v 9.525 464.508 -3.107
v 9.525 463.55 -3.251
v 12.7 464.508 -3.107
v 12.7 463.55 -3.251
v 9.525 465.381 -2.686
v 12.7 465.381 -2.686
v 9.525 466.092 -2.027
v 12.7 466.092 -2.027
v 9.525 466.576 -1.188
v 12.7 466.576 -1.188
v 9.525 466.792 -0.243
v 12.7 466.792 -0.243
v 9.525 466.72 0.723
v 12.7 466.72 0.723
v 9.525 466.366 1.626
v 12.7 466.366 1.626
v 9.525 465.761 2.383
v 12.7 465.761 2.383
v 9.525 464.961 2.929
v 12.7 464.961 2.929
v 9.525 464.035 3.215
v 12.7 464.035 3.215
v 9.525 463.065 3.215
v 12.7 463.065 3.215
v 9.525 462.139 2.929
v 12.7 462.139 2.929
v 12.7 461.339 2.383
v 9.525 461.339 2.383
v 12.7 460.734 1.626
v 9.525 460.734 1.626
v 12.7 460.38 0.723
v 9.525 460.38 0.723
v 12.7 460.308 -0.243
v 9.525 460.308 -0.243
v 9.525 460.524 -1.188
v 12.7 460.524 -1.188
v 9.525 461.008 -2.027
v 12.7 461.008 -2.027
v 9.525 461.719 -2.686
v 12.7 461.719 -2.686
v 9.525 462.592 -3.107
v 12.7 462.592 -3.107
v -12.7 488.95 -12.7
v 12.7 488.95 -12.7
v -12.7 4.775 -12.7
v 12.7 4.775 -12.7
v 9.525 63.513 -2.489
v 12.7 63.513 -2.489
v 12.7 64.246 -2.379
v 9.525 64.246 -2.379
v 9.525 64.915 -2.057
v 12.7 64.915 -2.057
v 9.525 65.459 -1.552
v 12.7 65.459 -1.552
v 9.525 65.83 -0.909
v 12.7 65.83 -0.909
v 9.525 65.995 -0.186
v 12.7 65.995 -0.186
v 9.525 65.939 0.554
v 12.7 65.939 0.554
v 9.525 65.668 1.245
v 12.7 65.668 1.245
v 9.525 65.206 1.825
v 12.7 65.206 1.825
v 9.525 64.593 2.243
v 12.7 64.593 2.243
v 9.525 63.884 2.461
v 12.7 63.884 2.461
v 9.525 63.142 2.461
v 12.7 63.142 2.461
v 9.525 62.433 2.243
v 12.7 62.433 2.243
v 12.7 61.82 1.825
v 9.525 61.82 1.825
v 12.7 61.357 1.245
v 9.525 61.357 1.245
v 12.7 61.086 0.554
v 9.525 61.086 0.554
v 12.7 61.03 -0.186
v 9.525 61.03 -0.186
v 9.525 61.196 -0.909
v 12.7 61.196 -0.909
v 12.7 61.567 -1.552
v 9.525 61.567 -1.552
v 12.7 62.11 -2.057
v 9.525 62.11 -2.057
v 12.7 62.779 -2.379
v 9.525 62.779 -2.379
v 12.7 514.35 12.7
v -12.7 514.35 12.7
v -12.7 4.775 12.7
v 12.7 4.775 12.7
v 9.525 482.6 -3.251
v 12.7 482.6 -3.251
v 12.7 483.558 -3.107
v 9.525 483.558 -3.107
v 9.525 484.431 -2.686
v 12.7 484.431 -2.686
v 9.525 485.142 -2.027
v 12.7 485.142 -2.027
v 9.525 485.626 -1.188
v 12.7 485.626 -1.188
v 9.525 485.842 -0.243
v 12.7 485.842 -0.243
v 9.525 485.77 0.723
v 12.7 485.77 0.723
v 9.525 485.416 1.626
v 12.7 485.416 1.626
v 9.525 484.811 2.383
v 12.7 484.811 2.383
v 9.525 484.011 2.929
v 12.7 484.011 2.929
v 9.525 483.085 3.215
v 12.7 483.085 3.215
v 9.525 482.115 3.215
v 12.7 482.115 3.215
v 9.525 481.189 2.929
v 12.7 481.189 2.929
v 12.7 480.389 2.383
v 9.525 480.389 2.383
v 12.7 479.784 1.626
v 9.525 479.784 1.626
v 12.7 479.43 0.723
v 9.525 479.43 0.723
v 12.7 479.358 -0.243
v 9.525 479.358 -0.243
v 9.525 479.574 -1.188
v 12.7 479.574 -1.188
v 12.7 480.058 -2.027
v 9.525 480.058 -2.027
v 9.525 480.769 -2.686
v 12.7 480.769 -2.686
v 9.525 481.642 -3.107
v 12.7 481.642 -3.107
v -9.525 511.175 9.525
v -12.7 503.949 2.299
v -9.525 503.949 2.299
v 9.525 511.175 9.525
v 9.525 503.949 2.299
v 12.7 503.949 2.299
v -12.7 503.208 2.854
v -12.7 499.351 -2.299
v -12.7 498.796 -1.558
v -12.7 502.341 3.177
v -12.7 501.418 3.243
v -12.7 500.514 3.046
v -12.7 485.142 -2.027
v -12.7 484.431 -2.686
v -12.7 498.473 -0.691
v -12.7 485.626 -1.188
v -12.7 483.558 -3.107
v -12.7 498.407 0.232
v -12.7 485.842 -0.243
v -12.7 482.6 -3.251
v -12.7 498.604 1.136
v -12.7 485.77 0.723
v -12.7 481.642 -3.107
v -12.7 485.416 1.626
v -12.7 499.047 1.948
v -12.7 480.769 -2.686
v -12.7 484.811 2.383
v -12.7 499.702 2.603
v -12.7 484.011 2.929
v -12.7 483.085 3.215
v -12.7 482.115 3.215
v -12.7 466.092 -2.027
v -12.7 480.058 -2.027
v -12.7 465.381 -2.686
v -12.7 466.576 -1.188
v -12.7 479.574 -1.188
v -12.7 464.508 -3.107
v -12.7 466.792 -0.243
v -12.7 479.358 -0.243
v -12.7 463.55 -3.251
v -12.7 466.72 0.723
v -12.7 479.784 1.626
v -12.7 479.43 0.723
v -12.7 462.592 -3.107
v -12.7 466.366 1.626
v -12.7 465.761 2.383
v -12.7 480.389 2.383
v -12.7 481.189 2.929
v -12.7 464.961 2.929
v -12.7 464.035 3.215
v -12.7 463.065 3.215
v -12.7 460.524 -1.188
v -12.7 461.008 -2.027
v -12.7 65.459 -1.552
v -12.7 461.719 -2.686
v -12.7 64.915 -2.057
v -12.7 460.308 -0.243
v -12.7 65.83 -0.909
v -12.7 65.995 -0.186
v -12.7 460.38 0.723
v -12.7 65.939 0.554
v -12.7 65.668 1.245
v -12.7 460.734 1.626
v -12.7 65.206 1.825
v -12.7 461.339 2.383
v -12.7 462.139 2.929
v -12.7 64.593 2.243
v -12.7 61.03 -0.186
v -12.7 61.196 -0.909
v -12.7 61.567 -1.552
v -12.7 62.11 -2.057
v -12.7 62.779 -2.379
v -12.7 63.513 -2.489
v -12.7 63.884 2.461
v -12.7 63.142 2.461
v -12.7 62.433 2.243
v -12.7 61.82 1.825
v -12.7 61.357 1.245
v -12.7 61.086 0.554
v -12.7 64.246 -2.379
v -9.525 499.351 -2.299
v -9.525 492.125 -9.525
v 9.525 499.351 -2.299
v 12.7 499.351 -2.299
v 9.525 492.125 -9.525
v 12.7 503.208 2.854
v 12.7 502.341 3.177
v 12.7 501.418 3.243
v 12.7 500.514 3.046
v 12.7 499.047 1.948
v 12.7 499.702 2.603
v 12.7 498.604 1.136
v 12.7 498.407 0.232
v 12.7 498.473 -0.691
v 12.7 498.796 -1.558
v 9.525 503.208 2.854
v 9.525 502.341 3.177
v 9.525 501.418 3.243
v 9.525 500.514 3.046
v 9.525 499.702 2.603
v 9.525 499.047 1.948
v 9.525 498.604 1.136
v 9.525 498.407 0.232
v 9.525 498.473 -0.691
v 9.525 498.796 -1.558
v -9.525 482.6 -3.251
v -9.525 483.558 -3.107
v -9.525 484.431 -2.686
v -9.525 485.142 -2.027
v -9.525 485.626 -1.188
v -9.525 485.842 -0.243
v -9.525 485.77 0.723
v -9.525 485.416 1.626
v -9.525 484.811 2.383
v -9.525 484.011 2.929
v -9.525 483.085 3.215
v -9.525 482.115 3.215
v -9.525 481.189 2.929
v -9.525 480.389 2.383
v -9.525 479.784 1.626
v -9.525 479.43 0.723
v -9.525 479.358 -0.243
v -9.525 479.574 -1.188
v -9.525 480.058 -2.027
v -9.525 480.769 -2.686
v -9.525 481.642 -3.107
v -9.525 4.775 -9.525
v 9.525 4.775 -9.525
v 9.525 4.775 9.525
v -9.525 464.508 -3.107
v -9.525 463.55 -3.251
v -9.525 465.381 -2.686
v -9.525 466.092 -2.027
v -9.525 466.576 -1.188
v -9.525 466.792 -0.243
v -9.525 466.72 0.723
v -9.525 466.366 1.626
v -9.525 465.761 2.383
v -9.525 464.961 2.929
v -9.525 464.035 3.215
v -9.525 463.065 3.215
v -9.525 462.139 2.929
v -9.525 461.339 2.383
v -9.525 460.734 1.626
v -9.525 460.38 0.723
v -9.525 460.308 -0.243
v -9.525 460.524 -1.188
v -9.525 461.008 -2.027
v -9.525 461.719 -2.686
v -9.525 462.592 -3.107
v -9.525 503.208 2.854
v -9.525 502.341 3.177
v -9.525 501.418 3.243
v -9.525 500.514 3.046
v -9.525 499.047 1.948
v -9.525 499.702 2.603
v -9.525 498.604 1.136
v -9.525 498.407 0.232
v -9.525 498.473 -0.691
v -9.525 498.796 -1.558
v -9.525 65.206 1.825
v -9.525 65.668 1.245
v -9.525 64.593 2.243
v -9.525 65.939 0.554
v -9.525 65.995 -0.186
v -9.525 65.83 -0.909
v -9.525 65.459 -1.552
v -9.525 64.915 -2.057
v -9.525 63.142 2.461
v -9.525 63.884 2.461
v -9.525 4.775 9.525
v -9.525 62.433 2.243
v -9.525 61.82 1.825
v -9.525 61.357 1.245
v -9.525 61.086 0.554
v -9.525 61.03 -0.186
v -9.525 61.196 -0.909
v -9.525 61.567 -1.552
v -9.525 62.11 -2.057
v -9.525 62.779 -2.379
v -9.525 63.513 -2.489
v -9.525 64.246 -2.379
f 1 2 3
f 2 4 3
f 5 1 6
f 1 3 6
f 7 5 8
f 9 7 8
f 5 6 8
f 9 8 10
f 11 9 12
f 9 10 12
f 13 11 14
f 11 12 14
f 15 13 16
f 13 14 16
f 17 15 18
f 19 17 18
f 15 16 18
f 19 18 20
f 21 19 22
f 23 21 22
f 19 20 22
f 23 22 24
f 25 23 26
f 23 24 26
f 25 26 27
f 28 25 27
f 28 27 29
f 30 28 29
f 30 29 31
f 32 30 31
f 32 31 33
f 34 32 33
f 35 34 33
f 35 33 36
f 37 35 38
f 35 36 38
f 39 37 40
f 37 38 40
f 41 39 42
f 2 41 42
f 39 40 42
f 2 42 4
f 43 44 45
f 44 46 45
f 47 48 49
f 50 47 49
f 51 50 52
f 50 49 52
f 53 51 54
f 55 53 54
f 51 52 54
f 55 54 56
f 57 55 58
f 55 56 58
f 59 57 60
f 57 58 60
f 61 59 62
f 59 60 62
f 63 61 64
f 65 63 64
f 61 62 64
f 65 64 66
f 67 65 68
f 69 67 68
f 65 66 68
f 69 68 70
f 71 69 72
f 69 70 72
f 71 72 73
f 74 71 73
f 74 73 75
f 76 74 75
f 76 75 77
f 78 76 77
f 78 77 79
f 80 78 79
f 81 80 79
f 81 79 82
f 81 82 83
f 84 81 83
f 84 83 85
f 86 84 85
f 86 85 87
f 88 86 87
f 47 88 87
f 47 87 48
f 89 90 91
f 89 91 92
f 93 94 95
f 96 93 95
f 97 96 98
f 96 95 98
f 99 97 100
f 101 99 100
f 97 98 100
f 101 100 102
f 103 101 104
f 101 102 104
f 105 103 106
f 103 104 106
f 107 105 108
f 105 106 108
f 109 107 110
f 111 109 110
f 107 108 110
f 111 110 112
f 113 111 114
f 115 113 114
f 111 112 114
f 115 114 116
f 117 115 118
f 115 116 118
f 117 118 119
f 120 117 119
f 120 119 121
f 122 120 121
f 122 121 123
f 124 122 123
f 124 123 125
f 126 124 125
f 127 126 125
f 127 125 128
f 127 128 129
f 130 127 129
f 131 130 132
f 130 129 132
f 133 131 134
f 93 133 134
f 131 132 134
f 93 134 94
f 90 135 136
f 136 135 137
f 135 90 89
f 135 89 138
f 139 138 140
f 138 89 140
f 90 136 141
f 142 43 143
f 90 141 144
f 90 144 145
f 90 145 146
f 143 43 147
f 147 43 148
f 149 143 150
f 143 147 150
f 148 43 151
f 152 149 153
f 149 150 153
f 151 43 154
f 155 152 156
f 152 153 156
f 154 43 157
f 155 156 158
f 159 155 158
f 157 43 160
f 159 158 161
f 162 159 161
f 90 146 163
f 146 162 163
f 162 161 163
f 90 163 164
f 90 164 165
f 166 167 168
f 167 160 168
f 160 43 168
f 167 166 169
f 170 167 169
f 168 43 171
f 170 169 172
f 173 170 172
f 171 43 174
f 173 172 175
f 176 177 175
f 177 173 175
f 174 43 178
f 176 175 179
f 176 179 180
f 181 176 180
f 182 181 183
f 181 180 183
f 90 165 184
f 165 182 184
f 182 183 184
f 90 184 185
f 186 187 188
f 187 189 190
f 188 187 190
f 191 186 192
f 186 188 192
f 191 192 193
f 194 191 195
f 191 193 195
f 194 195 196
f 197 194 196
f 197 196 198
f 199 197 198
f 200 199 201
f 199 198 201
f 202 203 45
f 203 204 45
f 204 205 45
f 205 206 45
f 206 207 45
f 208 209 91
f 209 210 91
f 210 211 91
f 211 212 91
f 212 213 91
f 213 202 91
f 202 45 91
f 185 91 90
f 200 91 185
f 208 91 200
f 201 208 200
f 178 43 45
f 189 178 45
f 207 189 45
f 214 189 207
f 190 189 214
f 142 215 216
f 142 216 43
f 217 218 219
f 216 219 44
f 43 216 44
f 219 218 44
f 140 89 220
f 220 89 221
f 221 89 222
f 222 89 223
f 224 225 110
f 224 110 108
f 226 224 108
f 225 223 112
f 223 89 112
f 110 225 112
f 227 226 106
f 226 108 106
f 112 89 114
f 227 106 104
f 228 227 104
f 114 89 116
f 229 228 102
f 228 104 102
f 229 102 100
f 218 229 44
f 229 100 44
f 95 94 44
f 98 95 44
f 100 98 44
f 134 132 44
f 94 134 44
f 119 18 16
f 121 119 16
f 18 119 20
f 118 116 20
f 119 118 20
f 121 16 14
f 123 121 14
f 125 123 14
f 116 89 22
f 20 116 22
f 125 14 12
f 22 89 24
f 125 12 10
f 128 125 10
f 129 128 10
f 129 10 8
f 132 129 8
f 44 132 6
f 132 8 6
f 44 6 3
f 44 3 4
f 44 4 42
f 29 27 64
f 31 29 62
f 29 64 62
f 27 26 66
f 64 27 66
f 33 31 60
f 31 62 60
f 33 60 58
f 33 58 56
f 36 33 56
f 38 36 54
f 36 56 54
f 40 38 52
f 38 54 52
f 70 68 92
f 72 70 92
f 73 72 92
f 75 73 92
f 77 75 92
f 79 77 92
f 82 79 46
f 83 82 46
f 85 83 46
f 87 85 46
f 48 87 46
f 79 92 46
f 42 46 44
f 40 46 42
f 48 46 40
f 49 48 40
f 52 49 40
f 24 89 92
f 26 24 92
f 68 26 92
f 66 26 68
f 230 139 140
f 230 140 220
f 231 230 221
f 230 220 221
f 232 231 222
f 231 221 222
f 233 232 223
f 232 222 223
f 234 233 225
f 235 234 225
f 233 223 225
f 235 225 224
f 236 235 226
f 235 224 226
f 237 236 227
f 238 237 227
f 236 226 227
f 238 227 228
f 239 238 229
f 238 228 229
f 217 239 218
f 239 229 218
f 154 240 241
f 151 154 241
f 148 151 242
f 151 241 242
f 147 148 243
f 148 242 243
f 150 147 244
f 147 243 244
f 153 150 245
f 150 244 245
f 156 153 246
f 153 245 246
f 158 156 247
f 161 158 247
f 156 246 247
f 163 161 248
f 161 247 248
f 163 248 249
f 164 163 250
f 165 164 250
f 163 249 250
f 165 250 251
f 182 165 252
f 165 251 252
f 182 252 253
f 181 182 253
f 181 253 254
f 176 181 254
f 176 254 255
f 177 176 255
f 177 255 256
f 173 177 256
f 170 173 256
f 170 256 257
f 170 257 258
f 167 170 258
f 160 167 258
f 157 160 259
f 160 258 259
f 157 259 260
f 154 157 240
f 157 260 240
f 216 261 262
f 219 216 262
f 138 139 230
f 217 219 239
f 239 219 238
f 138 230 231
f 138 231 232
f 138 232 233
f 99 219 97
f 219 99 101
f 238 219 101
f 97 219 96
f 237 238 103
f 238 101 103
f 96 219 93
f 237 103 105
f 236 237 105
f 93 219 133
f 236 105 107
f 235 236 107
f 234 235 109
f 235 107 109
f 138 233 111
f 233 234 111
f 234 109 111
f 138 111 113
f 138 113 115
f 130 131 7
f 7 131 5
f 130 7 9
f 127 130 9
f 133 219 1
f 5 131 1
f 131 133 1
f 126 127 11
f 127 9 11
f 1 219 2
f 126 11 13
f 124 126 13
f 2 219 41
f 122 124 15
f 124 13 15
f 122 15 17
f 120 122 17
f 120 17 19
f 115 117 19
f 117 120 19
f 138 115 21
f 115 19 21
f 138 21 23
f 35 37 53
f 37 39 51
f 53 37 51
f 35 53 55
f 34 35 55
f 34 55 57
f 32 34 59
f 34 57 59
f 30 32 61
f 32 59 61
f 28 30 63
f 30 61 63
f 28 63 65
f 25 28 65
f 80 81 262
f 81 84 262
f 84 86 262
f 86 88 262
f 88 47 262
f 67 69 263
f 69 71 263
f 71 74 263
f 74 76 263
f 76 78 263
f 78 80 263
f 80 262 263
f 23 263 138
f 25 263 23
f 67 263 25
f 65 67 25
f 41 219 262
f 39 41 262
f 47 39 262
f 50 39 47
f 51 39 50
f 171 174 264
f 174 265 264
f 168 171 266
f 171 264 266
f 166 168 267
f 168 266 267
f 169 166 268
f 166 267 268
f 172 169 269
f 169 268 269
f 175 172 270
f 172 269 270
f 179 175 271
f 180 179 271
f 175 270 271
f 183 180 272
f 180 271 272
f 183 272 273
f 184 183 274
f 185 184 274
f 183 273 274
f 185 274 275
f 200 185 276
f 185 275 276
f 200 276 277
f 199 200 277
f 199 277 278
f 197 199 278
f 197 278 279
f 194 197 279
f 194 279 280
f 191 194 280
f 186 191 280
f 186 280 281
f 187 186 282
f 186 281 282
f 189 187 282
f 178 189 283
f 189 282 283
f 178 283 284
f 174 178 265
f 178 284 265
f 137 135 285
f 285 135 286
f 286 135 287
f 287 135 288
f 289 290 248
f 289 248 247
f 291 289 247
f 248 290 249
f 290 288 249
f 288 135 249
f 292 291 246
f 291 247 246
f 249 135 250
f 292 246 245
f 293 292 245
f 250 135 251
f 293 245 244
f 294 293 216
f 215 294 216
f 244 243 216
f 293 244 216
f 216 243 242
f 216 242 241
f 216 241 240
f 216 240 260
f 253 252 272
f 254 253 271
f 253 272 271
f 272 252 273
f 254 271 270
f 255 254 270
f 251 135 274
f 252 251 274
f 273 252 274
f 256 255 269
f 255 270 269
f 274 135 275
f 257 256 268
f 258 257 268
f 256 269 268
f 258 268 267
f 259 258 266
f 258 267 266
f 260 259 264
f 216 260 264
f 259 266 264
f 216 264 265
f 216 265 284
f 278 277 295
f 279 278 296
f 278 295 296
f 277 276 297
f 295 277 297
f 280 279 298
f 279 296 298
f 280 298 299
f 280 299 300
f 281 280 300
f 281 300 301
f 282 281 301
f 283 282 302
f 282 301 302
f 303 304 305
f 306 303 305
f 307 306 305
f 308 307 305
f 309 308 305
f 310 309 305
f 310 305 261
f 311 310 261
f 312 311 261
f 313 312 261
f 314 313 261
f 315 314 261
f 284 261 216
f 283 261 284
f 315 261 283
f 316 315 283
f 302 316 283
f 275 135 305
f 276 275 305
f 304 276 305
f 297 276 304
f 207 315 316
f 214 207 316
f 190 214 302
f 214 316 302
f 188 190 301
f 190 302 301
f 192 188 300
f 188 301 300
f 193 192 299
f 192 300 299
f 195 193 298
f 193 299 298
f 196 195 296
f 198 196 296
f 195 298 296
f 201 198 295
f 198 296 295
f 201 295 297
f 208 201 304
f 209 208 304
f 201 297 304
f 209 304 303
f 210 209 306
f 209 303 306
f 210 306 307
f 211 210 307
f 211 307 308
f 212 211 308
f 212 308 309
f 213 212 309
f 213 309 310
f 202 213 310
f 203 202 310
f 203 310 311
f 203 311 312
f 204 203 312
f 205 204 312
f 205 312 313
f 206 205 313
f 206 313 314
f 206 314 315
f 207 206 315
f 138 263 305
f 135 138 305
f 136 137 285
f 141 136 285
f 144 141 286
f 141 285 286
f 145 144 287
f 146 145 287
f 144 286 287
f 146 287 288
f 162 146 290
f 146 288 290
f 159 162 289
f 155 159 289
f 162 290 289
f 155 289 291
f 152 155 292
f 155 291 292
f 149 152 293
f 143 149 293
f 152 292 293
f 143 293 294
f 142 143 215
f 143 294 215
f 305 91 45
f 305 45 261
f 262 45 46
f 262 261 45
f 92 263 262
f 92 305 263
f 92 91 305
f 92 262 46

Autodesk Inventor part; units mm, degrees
ref_plane "YZ Plane" through (0, 0, 0) normal (1, 0, 0) x (0, 1, 0)
ref_plane "XZ Plane" through (0, 0, 0) normal (0, 1, 0) x (-1, 0, 0)
ref_plane "XY Plane" through (0, 0, 0) normal (0, 0, 1) x (1, 0, 0)
sketch "Sketch1" plane through (0, 0, 0) normal (0, 1, 0) x (-1, 0, 0)
  line L0 (-12.7, -12.7) -> (12.7, -12.7)
  line L1 (12.7, -12.7) -> (12.7, 12.7)
  line L2 (12.7, 12.7) -> (-12.7, 12.7)
  line L3 (-12.7, 12.7) -> (-12.7, -12.7)
  line L4 (-12.7, -12.7) -> (12.7, 12.7) construction
  line L5 (12.7, -12.7) -> (-12.7, 12.7) construction
  line L6 (9.525, 9.525) -> (9.525, -9.525)
  line L7 (9.525, -9.525) -> (-9.525, -9.525)
  line L8 (-9.525, -9.525) -> (-9.525, 9.525)
  line L9 (-9.525, 9.525) -> (9.525, 9.525)
  point P0 (0, 0)
  dimension "d0" = 25.4
  dimension "d1" = 25.4
  dimension "d2" = 3.175
extrude "Extrusion1" add sketch "Sketch1" along normal blind 514.35
sketch "Sketch2" plane through (12.7, 0, 12.7) normal (1, 0, 0) x (0, 0, -1)
  line L0 (25.4, 514.35) -> (0, 514.35) projected
  line L1 (0, 514.35) -> (25.4, 488.95)
  line L2 (25.4, 0) -> (25.4, 514.35) projected
  circle A0 centre (12.7, 482.6) radius 3.2512
  line L3 (0, 514.35) -> (25.4, 514.35) projected
  circle A1 centre (12.7, 463.55) radius 3.2512
  circle A2 centre (12.7, 501.65) radius 3.2512
  point P0 (12.7, 0)
  point P1 (12.7, 514.35)
  point P2 (12.7, 514.35)
  point P3 (14.9989, 499.3511)
  point P4 (10.4011, 503.9489)
  dimension "d5" = 25.4
  dimension "d6" = 6.5024
  dimension "d7" = 31.75
  dimension "d8" = 19.05
extrude "Extrusion2" cut sketch "Sketch2" against normal blind 522.224
sketch "Sketch3" plane through (0, 0, 0) normal (0, -1, 0) x (1, 0, 0)
  line L0 (-12.7, -12.7) -> (-12.7, 12.7) projected
  line L1 (12.7, -12.7) -> (-12.7, -12.7) projected
  line L2 (12.7, 12.7) -> (12.7, -12.7) projected
  line L3 (-12.7, 12.7) -> (12.7, 12.7) projected
  line L4 (-9.525, 9.525) -> (-9.525, -9.525) projected
  line L5 (9.525, 9.525) -> (-9.525, 9.525) projected
  line L6 (9.525, -9.525) -> (9.525, 9.525) projected
  line L7 (-9.525, -9.525) -> (9.525, -9.525) projected
  point P0 (0, 0)
extrude "Extrusion3" cut sketch "Sketch3" against normal blind 4.7752
sketch "Sketch4" plane through (12.7, 4.7752, 12.7) normal (1, 0, 0) x (0, 0, -1)
  line L0 (0, 0) -> (25.4, 0) projected
  circle A0 centre (12.7, 58.7375) radius 2.4892
  point P0 (12.7, -4.7752)
  point P1 (12.7, 0)
  dimension "d13" = 4.9784
  dimension "d14" = 58.7375
extrude "Extrusion4" cut sketch "Sketch4" against normal blind 25.4
properties part number "STRU_007_BilletPole_SwerveOffset" material "Aluminum 6061"
